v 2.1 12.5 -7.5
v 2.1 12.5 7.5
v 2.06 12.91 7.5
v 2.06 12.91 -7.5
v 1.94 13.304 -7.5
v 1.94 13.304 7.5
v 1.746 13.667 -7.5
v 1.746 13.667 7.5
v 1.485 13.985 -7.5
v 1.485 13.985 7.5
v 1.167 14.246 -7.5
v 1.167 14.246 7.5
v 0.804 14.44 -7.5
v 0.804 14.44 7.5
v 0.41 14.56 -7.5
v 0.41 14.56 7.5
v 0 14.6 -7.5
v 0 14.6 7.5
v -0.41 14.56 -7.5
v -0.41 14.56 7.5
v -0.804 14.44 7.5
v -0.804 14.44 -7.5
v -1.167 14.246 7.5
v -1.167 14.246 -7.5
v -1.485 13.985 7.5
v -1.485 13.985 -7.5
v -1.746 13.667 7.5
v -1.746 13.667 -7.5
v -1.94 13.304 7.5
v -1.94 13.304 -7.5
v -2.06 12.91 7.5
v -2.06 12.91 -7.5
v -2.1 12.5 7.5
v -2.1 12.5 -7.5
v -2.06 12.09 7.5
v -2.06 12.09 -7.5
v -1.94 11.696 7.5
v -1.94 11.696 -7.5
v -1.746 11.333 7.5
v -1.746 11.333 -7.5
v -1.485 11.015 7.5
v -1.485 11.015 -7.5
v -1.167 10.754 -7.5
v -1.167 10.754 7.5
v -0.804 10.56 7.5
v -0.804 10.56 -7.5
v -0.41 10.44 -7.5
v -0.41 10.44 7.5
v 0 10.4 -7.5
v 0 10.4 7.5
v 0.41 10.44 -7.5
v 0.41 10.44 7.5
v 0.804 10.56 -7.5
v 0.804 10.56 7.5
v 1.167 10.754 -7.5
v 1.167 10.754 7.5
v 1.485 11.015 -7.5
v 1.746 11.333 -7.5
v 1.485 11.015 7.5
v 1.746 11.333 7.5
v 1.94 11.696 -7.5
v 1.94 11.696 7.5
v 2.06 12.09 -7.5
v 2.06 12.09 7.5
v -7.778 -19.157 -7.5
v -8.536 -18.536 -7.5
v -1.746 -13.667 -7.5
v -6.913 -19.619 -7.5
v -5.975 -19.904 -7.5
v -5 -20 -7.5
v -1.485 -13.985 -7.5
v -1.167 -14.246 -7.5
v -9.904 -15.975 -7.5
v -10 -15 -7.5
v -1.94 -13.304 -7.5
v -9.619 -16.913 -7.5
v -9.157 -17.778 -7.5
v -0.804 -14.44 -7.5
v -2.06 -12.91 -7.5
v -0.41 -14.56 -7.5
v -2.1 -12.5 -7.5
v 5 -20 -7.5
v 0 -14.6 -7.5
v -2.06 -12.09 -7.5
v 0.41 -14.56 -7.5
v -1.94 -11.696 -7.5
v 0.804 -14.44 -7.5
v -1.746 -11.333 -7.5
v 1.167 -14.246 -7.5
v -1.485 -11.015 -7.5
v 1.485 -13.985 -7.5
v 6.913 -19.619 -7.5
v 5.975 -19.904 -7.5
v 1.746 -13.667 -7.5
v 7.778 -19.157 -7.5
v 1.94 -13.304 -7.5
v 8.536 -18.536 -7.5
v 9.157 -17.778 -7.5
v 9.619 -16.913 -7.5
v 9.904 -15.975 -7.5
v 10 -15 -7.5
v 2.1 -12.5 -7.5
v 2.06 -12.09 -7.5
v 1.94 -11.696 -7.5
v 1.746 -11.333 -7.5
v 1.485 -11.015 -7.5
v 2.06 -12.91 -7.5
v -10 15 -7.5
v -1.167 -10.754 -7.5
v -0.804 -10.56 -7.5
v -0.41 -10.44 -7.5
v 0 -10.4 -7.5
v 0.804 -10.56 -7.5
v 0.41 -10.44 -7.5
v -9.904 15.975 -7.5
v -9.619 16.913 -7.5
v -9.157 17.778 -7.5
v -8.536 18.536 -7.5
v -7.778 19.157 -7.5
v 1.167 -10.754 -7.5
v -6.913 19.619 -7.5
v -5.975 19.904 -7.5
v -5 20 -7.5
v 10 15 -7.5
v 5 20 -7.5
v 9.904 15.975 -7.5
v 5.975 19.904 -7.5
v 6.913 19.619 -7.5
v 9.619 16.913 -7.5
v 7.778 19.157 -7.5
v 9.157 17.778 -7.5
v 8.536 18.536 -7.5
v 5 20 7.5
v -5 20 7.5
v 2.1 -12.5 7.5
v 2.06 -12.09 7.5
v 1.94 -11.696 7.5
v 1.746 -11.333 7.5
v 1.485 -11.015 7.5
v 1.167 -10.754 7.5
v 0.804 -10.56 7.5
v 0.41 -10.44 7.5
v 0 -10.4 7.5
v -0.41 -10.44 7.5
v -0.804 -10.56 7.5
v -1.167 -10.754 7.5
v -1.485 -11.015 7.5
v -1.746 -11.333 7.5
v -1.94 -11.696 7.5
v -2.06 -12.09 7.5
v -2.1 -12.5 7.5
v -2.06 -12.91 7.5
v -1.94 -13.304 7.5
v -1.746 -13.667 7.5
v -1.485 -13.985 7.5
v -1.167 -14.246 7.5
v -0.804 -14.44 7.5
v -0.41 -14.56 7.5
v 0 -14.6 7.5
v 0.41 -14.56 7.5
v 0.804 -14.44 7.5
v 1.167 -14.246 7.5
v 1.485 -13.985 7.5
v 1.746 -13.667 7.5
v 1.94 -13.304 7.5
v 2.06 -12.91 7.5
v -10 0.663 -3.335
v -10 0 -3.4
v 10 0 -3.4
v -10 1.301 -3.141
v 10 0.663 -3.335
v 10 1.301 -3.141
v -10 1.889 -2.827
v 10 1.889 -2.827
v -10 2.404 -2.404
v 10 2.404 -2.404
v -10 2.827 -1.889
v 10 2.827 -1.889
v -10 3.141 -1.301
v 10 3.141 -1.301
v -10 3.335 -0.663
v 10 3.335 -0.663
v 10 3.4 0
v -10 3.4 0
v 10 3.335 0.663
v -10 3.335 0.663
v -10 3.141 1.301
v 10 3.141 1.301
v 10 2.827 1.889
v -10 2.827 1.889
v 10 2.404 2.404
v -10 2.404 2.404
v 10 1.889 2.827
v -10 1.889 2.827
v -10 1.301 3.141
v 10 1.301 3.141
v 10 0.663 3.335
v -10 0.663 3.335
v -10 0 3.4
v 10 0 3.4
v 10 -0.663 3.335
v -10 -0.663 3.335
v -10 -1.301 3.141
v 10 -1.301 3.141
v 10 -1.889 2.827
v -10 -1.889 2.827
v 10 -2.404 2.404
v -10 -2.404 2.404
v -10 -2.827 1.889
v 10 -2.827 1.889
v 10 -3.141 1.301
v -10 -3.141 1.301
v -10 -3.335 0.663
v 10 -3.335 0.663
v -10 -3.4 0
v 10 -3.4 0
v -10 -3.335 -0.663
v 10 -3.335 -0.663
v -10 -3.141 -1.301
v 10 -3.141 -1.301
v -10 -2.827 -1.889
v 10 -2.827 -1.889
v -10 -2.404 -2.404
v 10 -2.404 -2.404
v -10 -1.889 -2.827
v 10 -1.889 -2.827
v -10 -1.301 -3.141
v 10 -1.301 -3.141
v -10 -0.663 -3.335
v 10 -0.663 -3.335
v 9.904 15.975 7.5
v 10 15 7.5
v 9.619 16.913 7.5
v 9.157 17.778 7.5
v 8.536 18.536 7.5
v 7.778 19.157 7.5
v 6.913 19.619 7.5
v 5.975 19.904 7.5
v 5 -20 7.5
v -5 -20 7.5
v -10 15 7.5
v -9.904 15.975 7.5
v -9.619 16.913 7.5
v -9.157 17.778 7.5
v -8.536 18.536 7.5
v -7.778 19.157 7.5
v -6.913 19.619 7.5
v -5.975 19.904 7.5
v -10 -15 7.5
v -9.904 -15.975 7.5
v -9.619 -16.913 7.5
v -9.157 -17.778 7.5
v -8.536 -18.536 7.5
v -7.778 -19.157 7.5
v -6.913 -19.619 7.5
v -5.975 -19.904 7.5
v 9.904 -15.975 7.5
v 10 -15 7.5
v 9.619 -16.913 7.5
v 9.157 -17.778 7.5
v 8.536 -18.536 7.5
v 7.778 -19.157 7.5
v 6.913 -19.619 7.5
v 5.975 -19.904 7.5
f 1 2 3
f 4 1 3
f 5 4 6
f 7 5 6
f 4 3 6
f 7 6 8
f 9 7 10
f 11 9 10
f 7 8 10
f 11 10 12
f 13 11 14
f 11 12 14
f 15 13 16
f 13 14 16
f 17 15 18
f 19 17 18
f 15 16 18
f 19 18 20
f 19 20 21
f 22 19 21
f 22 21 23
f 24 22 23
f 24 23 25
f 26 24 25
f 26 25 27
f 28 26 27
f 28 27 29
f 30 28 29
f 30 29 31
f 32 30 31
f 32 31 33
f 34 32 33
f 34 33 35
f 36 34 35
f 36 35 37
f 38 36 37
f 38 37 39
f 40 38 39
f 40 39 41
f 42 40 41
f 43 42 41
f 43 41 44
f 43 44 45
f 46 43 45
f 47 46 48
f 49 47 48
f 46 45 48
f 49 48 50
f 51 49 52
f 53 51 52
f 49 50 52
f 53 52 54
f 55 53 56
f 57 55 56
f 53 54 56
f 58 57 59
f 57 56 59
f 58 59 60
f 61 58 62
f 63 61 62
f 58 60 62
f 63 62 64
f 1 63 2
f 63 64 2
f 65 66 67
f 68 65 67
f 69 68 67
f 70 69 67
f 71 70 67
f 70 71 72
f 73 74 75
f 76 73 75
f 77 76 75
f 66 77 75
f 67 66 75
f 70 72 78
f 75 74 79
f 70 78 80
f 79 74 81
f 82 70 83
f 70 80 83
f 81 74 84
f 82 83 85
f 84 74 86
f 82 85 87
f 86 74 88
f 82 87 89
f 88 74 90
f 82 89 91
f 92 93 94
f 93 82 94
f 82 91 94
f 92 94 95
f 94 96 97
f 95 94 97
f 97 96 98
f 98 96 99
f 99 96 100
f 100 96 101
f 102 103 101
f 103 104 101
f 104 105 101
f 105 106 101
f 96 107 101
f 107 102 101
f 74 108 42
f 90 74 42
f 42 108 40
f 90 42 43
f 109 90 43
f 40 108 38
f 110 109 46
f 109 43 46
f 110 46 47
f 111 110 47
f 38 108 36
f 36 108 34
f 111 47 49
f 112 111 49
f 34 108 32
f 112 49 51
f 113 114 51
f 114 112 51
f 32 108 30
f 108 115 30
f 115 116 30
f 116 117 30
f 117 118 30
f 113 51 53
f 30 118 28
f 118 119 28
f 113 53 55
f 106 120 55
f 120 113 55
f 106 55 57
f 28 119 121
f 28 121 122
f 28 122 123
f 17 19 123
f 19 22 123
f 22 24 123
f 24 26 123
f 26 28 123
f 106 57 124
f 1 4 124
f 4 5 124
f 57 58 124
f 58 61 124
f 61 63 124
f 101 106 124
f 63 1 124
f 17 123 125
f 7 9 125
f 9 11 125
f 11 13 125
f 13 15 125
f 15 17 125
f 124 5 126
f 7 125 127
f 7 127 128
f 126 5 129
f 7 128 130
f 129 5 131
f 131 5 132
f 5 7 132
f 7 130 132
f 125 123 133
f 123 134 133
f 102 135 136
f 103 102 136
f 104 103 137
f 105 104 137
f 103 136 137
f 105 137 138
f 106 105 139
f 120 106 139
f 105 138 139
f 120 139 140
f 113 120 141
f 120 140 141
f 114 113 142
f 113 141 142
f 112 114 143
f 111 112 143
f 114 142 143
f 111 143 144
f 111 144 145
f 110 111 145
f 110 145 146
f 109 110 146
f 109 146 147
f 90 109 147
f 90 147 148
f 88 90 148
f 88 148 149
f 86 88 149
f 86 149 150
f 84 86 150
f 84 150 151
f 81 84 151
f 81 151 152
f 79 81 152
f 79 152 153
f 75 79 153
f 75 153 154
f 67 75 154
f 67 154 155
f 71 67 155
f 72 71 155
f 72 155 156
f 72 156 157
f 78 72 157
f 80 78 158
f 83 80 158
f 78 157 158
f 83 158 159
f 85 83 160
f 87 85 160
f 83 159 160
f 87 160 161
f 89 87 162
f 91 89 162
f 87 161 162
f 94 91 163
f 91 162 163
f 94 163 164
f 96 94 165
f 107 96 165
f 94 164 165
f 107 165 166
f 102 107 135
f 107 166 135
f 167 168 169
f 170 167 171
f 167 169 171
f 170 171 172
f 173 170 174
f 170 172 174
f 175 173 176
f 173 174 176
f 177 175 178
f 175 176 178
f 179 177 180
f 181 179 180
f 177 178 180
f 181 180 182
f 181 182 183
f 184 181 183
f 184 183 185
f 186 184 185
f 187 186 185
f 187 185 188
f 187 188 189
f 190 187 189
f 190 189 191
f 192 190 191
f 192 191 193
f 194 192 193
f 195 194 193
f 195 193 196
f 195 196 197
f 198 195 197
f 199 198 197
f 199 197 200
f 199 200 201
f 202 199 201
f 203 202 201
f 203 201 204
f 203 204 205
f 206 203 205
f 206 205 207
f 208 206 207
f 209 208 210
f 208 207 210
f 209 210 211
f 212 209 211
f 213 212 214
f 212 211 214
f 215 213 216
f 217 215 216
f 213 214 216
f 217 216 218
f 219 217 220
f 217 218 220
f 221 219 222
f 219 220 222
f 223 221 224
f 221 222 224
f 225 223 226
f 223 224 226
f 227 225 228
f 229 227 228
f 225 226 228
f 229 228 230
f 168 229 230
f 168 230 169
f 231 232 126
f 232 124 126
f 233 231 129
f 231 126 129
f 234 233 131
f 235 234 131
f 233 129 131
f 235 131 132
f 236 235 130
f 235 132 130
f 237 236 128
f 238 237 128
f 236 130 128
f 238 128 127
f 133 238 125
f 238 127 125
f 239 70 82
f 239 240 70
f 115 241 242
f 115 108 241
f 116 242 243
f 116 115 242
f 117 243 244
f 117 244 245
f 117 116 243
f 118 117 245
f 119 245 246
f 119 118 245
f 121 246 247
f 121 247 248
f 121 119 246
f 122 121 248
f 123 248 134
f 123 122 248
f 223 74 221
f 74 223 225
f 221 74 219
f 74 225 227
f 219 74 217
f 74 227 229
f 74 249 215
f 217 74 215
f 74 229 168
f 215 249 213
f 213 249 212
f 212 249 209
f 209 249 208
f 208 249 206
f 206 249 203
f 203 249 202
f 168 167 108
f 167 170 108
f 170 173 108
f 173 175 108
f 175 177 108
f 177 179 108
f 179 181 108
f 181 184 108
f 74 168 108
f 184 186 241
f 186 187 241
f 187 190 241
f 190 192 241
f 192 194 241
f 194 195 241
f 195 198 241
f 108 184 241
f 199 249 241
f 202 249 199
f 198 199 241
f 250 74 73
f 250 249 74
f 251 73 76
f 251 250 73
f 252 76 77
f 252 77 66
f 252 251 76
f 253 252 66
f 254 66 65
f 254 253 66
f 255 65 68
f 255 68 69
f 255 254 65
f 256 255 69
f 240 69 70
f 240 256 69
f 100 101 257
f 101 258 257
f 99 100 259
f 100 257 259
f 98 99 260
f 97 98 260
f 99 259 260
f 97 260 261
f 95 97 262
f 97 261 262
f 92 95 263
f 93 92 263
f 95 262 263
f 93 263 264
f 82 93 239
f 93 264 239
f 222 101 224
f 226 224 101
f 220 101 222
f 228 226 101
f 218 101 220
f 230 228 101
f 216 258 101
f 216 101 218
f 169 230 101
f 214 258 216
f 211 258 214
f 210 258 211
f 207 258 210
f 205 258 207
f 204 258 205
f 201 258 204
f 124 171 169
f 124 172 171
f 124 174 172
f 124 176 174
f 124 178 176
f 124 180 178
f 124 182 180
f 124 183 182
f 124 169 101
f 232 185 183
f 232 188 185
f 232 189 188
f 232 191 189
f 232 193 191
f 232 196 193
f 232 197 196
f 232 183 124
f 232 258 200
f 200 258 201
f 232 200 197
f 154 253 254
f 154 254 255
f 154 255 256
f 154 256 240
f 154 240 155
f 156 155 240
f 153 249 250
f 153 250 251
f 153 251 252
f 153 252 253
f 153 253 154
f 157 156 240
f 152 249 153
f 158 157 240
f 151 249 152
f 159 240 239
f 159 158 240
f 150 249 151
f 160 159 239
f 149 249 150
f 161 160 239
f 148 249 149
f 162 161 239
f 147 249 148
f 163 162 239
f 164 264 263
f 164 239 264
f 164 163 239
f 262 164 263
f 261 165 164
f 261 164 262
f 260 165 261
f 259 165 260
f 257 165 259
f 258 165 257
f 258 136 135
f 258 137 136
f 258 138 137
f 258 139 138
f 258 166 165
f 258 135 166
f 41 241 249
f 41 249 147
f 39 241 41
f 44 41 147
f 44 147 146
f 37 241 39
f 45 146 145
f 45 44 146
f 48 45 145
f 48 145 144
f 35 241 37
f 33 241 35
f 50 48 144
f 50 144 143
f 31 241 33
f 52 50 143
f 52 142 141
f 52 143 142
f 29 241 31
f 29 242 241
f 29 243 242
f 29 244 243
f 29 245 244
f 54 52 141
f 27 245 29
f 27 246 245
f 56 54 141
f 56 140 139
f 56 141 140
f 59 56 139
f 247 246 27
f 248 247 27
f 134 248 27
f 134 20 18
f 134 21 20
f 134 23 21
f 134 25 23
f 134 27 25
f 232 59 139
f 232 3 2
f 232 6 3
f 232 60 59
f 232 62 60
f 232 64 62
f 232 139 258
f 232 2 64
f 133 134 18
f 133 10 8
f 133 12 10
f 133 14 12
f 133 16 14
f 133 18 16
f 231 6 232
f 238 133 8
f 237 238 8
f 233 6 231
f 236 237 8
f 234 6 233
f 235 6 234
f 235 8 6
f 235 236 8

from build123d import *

# Parameters (mm, degrees)
IZIM1_W                     = 20
IZIM1_H                     = 40
Y_KSEKLIK_EKSTR_ZYON1_DEPTH = 7.5
RADYUS1_R                   = 5
M5_DI_LI_DELIK1_D           = 4.2
M8_DI_LI_DELIK1_D           = 6.8


with BuildPart() as part:
    # Çizim1 → Yükseklik-Ekstrüzyon1 (new, symmetric)
    with BuildSketch(Plane.XY):
        Rectangle(IZIM1_W, IZIM1_H)
    extrude(amount=Y_KSEKLIK_EKSTR_ZYON1_DEPTH, both=True)

    # Radyus1
    radyus1_edges = [part.edges().sort_by_distance(p)[0] for p in [
        (10, -20, 0),
        (-10, -20, 0),
        (-10, 20, 0),
        (10, 20, 0),
    ]]
    fillet(radyus1_edges, radius=RADYUS1_R)

    # M5 Dişli Delik1 (through all)
    with Locations(Plane(origin=(0, 12.5, -7.5), x_dir=(-1, 0, 0), z_dir=(0, 0, -1))):
        with Locations((0, 0), (0, -25)):
            Hole(M5_DI_LI_DELIK1_D / 2)

    # M8 Dişli Delik1 (through all)
    with Locations(Plane.ZY.offset(10)):
        with Locations((0, 0)):
            Hole(M8_DI_LI_DELIK1_D / 2)


solid = part.part
